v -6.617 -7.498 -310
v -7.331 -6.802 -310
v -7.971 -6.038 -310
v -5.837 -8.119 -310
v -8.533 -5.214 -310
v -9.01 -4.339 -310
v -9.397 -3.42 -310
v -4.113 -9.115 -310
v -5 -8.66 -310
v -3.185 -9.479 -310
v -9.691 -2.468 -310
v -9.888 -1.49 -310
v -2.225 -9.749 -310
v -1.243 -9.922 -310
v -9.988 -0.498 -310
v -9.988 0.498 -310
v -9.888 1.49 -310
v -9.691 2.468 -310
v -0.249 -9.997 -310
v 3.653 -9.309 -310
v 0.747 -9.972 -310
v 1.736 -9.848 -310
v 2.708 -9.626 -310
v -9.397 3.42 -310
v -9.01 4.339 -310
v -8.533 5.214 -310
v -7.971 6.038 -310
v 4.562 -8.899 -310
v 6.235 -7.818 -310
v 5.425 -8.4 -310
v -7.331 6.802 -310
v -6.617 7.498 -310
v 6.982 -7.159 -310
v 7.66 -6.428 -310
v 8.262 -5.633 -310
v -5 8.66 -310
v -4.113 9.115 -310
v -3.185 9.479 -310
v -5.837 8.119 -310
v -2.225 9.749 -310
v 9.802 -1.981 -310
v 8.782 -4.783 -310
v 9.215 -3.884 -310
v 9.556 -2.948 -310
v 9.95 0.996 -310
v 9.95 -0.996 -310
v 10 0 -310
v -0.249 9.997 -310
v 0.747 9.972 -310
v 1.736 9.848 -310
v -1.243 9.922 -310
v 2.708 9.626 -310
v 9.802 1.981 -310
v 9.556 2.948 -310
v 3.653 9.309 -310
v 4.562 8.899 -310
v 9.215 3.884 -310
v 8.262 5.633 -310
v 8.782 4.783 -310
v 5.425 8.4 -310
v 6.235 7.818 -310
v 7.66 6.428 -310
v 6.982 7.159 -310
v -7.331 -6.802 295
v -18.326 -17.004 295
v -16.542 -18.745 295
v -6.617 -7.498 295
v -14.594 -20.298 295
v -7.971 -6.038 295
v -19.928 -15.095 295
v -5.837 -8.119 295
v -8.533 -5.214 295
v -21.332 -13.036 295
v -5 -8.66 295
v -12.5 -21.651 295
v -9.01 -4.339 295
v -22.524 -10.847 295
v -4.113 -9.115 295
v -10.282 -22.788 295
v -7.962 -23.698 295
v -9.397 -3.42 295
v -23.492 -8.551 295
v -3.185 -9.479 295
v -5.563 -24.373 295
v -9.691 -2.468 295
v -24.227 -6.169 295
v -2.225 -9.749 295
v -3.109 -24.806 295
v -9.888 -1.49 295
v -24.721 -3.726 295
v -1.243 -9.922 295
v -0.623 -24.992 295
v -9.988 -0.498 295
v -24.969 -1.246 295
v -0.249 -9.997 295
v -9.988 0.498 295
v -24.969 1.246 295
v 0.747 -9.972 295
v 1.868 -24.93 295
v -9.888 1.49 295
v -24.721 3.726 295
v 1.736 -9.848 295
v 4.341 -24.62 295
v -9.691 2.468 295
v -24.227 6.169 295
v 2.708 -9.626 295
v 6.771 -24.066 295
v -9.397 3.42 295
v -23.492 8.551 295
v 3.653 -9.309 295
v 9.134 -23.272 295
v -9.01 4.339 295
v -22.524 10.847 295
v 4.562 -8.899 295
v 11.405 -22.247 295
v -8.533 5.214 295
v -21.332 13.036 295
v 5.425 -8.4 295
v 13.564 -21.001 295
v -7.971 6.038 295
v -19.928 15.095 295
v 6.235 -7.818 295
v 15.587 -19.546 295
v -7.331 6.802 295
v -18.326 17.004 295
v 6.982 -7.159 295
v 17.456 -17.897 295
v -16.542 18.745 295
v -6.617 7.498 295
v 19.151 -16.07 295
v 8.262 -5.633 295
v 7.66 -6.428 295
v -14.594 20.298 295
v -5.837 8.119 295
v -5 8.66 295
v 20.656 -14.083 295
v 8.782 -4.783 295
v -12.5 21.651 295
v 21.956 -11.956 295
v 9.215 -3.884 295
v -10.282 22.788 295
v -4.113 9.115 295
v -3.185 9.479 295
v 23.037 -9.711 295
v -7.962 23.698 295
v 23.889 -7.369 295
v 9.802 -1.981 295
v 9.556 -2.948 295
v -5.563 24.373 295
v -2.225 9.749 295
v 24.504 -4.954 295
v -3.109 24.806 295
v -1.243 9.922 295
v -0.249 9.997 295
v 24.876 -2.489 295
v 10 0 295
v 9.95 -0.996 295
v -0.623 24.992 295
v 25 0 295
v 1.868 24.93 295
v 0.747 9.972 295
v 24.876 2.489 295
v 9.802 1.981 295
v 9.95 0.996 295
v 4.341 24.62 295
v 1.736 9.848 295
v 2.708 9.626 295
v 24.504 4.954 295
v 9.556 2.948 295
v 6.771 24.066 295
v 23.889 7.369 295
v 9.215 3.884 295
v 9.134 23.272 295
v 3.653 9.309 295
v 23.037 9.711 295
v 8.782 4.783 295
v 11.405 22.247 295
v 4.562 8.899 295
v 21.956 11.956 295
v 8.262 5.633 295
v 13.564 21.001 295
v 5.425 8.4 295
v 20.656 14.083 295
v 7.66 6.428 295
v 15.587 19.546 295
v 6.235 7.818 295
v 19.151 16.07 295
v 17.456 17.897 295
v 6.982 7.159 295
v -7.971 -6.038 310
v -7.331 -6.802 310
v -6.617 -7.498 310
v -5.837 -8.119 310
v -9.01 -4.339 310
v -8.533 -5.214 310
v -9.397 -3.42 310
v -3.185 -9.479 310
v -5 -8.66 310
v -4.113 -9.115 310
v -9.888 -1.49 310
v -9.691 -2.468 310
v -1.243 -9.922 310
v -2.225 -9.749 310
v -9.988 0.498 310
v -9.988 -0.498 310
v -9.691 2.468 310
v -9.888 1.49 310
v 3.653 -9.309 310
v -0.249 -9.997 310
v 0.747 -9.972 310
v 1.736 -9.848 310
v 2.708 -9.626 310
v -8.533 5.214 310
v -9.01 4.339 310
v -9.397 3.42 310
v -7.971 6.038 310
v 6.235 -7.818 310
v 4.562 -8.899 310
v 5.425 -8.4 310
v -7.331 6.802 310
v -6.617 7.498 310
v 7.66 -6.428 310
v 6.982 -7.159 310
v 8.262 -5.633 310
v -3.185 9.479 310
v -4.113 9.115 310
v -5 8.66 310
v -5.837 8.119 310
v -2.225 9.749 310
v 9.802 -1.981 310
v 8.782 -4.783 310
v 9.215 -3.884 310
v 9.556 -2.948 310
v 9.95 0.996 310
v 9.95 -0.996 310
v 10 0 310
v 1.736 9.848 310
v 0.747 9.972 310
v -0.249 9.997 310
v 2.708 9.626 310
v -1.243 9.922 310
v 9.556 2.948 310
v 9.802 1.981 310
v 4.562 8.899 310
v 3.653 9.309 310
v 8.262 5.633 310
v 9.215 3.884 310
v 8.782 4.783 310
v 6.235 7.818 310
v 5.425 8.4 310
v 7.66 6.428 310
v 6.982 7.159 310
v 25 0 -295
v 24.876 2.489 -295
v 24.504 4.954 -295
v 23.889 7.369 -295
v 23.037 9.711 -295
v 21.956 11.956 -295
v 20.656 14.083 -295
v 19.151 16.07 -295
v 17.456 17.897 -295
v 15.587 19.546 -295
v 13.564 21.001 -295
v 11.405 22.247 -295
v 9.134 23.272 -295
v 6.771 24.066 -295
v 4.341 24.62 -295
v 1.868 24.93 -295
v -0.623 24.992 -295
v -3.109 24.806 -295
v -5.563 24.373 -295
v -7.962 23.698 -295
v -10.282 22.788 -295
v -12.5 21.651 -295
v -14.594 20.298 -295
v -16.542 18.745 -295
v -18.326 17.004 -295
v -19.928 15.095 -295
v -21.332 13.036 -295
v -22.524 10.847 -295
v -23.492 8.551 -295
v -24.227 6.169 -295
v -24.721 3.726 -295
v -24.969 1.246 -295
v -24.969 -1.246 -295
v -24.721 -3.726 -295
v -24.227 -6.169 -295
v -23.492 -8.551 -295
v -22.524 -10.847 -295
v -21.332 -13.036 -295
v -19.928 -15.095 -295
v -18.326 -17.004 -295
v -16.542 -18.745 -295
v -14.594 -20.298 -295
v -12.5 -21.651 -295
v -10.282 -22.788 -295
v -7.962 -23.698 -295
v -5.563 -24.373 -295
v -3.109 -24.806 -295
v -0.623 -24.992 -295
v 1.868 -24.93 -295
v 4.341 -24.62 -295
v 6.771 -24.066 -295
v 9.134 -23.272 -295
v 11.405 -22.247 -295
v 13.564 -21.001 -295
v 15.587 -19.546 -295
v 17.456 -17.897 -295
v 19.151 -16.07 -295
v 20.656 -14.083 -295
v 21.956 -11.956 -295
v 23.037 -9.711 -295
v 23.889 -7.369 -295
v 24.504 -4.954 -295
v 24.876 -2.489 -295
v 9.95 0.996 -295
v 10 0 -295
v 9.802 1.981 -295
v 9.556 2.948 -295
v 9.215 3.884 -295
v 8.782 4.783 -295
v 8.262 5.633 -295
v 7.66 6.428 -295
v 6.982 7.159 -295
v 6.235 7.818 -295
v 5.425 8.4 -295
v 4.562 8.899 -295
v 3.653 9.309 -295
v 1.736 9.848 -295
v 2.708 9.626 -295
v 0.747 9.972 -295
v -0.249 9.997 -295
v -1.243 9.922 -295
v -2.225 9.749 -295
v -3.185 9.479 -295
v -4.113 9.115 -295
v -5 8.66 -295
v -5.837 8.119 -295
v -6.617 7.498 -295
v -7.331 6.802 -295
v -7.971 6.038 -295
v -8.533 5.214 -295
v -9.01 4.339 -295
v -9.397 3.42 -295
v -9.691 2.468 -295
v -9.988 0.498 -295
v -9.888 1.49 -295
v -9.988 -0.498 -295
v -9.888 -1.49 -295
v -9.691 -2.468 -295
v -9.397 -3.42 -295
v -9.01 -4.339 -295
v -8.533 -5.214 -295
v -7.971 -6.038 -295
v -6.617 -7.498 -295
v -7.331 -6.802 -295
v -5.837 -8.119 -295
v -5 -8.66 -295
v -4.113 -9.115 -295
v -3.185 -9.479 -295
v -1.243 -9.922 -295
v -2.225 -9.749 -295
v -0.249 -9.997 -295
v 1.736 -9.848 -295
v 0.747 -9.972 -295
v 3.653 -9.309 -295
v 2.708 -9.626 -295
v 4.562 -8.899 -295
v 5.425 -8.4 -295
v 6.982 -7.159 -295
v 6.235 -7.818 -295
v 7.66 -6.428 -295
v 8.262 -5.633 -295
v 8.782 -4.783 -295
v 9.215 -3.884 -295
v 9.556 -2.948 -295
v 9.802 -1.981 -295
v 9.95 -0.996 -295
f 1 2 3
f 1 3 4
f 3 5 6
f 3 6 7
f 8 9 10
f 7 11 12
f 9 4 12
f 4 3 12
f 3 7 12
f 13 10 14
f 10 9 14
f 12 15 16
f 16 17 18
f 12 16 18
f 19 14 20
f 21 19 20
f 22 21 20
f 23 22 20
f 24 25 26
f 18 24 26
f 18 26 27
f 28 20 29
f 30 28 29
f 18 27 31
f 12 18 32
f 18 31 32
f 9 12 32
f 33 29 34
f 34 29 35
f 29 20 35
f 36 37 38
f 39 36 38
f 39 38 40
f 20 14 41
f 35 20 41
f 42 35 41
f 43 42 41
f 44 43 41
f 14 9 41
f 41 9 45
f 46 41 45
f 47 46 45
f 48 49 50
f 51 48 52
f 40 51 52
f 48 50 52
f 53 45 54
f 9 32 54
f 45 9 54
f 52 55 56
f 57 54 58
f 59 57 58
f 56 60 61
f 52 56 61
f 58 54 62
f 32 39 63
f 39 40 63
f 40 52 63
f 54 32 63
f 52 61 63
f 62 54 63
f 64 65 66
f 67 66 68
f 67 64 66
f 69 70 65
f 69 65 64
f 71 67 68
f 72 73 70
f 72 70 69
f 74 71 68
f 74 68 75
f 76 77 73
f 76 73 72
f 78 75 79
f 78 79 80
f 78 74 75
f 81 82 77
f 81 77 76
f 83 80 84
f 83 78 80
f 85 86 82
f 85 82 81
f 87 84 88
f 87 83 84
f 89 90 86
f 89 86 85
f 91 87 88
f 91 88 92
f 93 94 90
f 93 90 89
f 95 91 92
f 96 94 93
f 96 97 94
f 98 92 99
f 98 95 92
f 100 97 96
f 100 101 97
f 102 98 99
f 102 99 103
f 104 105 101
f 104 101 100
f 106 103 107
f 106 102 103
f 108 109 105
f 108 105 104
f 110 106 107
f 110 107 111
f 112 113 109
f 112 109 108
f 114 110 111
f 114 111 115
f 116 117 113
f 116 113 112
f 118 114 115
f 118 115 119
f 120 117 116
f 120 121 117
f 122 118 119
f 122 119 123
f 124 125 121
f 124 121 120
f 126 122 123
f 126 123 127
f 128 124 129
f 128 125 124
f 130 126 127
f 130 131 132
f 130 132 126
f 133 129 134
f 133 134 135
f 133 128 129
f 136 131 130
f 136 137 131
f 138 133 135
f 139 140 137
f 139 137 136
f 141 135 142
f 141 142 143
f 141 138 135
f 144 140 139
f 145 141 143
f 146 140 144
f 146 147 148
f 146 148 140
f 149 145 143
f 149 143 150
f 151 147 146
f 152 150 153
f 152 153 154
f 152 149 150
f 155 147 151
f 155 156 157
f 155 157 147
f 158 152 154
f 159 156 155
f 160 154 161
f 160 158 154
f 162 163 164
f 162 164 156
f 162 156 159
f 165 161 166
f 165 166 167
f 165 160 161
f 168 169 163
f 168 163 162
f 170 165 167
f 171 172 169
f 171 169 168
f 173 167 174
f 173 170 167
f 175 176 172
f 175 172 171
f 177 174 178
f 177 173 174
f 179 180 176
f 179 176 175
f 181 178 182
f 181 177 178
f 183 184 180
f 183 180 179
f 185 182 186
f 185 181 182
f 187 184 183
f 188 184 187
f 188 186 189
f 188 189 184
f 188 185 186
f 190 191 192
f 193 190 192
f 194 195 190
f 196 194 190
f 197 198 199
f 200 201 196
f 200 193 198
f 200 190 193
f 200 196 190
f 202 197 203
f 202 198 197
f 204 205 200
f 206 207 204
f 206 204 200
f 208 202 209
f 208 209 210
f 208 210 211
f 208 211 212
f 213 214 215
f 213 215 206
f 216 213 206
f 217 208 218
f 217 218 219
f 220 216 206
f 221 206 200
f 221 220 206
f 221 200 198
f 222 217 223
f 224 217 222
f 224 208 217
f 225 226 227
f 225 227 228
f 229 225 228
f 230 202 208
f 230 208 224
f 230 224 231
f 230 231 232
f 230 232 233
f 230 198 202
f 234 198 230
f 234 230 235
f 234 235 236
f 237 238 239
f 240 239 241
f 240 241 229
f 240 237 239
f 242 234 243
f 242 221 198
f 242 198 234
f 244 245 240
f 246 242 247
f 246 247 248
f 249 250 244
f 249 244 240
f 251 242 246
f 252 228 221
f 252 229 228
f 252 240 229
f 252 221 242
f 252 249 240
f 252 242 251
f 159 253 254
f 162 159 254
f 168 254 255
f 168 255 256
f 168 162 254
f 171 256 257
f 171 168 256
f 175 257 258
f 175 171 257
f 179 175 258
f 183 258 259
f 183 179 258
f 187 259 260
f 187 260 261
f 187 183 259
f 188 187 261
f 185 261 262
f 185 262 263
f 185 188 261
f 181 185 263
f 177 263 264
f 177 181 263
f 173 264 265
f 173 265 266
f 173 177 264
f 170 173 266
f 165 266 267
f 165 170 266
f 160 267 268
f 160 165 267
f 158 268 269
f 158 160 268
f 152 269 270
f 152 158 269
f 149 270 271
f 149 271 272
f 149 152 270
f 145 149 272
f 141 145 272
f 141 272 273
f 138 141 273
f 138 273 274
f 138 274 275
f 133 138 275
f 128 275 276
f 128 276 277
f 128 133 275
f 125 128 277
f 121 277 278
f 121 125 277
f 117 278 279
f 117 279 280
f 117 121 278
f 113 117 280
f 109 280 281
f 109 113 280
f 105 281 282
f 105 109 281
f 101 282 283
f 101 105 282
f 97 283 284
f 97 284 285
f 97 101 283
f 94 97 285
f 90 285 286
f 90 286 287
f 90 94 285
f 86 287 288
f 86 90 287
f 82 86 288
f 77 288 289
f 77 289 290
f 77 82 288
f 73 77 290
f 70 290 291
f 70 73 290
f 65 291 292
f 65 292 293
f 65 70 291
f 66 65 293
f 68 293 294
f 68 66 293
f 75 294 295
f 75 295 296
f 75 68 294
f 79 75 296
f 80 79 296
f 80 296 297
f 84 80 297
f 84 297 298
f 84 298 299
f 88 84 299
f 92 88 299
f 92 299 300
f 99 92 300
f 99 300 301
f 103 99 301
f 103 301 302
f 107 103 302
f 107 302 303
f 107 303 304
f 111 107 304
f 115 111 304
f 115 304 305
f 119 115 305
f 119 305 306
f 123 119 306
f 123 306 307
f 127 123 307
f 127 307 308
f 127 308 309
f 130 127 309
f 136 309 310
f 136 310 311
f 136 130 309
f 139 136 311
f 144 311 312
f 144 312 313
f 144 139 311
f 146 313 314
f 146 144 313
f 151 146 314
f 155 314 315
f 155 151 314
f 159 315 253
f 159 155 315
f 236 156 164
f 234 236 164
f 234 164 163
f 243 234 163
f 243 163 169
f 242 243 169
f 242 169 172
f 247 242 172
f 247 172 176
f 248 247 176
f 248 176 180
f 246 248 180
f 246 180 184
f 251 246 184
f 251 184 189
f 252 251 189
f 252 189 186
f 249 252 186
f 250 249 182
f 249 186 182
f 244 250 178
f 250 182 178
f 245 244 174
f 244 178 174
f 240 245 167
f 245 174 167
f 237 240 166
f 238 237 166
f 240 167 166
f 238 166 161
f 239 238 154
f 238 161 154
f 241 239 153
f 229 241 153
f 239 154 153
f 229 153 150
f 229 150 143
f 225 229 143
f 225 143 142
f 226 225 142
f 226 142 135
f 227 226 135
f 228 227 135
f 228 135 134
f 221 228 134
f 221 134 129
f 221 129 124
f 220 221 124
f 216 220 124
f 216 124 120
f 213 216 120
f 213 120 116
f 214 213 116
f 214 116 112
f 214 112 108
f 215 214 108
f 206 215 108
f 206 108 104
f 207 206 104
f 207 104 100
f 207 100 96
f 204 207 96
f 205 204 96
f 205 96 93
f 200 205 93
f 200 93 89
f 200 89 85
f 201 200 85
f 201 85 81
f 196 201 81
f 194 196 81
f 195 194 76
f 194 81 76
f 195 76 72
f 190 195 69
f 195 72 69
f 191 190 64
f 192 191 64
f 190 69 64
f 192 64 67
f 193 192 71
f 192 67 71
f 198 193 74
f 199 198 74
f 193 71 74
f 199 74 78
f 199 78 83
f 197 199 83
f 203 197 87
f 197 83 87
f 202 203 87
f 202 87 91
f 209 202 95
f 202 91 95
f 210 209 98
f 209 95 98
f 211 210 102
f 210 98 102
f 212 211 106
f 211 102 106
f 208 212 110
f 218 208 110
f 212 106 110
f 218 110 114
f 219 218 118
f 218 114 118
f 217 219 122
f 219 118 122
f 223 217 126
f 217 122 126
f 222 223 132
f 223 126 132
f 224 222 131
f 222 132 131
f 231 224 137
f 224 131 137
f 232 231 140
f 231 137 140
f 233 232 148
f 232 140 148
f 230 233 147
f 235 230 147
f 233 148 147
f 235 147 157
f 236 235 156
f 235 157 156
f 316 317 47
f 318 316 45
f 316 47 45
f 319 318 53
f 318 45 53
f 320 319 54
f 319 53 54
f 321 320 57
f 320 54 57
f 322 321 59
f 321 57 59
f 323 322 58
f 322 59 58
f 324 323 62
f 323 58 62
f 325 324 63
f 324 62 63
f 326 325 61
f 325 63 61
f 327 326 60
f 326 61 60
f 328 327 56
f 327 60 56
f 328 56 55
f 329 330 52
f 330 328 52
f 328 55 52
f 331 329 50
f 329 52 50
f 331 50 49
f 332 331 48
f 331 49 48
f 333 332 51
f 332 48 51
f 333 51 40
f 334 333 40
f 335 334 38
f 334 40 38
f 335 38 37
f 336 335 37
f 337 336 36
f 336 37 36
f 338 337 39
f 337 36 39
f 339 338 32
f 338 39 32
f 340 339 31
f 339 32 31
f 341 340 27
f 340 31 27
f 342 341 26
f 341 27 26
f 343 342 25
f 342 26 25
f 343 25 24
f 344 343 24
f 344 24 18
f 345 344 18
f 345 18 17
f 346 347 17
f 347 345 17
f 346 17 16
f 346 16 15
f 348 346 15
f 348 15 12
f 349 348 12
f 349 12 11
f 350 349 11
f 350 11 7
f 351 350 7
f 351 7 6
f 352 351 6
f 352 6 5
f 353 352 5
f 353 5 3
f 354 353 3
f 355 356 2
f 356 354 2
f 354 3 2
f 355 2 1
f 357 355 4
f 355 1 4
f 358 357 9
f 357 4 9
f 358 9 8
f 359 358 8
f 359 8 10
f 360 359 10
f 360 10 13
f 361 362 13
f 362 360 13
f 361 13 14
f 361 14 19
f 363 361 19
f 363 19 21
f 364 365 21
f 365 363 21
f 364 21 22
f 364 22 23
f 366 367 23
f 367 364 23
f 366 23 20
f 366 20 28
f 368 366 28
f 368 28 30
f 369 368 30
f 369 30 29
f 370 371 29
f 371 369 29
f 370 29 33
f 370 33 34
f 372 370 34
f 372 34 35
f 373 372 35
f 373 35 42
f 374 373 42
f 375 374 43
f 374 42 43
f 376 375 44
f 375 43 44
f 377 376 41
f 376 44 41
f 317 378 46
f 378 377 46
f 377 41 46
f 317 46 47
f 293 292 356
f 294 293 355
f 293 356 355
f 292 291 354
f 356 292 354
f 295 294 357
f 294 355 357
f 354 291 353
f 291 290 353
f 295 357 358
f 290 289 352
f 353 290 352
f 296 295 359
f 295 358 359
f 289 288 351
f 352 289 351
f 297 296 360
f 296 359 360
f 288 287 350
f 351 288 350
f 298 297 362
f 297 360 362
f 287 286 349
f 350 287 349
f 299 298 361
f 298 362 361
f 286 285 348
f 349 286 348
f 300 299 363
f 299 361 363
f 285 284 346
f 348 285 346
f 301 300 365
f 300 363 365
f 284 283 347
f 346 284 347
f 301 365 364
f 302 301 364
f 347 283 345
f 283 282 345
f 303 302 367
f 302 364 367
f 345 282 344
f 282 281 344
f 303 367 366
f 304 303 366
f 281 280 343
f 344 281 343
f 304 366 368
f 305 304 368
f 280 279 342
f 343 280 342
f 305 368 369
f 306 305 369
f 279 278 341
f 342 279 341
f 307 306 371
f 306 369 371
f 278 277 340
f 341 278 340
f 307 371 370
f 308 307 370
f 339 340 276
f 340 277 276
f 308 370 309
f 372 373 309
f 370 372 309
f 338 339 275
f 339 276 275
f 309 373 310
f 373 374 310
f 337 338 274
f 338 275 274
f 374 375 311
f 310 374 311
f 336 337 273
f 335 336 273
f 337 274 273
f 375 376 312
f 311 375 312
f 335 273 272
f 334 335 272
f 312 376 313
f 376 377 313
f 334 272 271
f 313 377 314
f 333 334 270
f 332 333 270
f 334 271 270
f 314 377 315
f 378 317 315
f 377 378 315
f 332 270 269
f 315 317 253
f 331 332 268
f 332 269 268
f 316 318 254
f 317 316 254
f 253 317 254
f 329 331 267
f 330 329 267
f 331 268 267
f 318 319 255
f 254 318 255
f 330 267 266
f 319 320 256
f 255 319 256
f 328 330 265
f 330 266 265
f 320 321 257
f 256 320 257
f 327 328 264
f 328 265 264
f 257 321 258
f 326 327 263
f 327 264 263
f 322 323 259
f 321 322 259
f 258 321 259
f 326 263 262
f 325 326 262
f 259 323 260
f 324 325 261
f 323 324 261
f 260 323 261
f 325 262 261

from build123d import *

# Parameters (mm, degrees)
SKETCH2_R                = 25
BOSS_EXTRUDE1_DEPTH      = 295
BOSS_EXTRUDE2_DEPTH      = 310
BOSS_EXTRUDE2_DEPTH_BACK = 310
SKETCH2_3_R              = 10


with BuildPart() as part:
    # Sketch2 → Boss-Extrude1 (new, symmetric)
    with BuildSketch(Plane.XY):
        Circle(SKETCH2_R)
    extrude(amount=BOSS_EXTRUDE1_DEPTH, both=True)

    # Sketch2<3> → Boss-Extrude2 (add, two sides: drawn at the far end of the back side and taken through both)
    with BuildSketch(Plane.XY.offset(-BOSS_EXTRUDE2_DEPTH_BACK)):
        Circle(SKETCH2_3_R)
    extrude(amount=BOSS_EXTRUDE2_DEPTH + BOSS_EXTRUDE2_DEPTH_BACK)


solid = part.part
